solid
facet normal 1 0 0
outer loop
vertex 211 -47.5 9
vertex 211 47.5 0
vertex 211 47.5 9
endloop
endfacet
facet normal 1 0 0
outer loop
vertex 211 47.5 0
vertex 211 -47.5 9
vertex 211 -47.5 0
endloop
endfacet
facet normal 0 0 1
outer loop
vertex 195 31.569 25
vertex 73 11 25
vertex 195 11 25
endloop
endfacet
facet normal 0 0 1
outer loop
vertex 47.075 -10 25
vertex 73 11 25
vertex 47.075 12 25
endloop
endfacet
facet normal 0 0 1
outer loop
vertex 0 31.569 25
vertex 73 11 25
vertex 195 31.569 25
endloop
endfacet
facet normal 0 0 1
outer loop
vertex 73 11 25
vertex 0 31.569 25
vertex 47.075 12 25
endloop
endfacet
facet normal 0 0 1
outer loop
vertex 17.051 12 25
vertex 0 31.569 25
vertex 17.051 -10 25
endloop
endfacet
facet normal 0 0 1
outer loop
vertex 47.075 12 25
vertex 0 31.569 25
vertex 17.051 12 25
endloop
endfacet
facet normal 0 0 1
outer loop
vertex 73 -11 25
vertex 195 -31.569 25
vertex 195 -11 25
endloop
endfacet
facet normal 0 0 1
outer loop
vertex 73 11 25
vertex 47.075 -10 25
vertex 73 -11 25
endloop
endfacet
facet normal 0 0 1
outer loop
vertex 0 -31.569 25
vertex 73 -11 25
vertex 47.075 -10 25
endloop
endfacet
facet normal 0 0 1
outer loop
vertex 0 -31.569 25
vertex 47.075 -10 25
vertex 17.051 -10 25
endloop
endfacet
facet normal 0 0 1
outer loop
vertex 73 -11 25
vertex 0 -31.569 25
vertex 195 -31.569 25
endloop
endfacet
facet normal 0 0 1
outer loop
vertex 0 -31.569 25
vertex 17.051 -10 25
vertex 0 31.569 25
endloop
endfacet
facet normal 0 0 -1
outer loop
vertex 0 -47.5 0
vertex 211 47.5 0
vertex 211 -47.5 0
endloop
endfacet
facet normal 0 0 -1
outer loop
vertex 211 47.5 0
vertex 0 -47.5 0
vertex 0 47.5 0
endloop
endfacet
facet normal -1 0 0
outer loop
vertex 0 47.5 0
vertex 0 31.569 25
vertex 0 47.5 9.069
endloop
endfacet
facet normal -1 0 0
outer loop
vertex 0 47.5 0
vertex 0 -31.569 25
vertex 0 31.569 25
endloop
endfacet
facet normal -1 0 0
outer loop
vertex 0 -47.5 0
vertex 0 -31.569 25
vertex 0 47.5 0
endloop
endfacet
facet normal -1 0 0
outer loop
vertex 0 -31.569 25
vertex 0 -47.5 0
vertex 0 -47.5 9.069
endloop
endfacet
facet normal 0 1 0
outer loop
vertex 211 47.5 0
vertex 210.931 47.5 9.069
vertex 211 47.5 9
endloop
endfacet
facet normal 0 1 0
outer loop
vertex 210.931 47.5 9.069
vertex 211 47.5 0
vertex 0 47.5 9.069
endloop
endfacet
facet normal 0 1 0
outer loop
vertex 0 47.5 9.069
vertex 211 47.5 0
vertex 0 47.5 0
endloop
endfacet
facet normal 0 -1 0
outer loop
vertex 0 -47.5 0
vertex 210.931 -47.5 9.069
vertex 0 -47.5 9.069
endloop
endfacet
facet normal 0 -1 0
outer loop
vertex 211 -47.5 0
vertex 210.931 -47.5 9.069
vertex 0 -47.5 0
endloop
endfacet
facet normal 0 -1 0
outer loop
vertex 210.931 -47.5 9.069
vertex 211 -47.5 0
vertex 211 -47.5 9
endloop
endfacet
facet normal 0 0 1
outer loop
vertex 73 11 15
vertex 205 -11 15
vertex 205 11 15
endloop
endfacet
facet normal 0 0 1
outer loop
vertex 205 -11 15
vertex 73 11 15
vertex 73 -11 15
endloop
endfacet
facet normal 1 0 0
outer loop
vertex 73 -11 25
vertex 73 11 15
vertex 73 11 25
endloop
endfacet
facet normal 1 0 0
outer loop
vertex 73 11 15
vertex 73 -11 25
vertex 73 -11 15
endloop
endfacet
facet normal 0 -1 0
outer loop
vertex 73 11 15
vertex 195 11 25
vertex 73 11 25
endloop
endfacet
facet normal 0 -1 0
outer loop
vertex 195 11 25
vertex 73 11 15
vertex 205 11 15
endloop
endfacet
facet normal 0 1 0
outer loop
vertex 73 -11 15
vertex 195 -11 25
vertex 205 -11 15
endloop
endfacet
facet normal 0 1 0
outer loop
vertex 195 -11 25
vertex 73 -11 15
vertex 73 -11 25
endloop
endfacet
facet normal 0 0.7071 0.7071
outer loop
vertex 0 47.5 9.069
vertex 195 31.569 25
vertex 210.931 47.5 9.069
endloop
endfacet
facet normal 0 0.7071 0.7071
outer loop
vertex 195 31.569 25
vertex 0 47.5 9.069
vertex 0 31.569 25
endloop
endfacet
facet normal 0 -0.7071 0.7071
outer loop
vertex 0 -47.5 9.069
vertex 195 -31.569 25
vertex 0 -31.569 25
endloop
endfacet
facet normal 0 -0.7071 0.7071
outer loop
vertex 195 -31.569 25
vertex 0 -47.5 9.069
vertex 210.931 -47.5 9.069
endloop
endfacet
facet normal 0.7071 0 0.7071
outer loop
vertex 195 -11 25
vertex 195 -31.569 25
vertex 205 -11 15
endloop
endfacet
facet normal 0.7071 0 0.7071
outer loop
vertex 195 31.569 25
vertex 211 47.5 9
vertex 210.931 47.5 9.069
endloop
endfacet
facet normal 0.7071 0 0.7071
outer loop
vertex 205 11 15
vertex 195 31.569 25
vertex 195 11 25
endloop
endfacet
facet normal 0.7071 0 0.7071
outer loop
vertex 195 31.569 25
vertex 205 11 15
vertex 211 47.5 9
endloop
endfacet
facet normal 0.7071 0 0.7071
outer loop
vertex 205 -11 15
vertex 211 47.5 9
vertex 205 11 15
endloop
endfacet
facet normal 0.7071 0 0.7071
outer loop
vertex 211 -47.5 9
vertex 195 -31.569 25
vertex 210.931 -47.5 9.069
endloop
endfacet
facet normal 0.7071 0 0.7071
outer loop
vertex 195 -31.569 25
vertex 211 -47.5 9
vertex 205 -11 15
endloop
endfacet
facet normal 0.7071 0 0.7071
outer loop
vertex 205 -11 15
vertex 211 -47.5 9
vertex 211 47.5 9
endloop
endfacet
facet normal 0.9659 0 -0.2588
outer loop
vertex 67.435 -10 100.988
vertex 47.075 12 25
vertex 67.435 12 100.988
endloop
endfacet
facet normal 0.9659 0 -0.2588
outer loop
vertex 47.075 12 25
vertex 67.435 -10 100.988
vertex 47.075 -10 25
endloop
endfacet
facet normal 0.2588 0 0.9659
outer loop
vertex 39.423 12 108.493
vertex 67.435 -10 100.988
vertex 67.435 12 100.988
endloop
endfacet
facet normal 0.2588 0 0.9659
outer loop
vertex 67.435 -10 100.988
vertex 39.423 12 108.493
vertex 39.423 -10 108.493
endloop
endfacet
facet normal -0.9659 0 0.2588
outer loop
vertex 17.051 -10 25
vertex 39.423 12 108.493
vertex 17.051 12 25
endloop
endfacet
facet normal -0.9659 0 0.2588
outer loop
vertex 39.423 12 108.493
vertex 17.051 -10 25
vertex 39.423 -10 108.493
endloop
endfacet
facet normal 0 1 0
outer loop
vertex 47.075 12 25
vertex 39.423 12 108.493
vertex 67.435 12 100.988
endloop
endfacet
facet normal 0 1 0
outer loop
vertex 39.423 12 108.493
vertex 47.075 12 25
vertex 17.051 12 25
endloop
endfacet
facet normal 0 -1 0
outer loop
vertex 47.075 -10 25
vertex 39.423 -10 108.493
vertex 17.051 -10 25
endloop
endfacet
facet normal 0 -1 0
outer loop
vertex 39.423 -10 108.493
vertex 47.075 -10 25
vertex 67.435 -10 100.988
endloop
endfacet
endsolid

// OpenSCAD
base_length = 211;
pillar_length = 29;
pillar_width = 22;
pillar_height = 100;
slot_length = 140;
slot_width = 22;

module plate () {difference () {
        translate ([0, -47.5, 0]){cube ([base_length, 95, 25]);}
        translate ([73, -11, 15])cube ([slot_length, slot_width, 11]);
        rotate(a=45, v=[1, 0, 0])translate ([-2, 40, -30])cube ([215, 40, 40]);
rotate(a=45, v=[1, 0, 0])translate ([-2, -40, 40])cube ([215, 40, 40]);
translate ([170, -50, 50])rotate(a=45, v=[0, 1, 0])cube ([100,100,50]);
}}
module base() {union(){plate();rotate(a=15, v=[0, 1, 0])translate ([10, -10, 15])cube ([pillar_length, pillar_width, pillar_height]);}}
base();
